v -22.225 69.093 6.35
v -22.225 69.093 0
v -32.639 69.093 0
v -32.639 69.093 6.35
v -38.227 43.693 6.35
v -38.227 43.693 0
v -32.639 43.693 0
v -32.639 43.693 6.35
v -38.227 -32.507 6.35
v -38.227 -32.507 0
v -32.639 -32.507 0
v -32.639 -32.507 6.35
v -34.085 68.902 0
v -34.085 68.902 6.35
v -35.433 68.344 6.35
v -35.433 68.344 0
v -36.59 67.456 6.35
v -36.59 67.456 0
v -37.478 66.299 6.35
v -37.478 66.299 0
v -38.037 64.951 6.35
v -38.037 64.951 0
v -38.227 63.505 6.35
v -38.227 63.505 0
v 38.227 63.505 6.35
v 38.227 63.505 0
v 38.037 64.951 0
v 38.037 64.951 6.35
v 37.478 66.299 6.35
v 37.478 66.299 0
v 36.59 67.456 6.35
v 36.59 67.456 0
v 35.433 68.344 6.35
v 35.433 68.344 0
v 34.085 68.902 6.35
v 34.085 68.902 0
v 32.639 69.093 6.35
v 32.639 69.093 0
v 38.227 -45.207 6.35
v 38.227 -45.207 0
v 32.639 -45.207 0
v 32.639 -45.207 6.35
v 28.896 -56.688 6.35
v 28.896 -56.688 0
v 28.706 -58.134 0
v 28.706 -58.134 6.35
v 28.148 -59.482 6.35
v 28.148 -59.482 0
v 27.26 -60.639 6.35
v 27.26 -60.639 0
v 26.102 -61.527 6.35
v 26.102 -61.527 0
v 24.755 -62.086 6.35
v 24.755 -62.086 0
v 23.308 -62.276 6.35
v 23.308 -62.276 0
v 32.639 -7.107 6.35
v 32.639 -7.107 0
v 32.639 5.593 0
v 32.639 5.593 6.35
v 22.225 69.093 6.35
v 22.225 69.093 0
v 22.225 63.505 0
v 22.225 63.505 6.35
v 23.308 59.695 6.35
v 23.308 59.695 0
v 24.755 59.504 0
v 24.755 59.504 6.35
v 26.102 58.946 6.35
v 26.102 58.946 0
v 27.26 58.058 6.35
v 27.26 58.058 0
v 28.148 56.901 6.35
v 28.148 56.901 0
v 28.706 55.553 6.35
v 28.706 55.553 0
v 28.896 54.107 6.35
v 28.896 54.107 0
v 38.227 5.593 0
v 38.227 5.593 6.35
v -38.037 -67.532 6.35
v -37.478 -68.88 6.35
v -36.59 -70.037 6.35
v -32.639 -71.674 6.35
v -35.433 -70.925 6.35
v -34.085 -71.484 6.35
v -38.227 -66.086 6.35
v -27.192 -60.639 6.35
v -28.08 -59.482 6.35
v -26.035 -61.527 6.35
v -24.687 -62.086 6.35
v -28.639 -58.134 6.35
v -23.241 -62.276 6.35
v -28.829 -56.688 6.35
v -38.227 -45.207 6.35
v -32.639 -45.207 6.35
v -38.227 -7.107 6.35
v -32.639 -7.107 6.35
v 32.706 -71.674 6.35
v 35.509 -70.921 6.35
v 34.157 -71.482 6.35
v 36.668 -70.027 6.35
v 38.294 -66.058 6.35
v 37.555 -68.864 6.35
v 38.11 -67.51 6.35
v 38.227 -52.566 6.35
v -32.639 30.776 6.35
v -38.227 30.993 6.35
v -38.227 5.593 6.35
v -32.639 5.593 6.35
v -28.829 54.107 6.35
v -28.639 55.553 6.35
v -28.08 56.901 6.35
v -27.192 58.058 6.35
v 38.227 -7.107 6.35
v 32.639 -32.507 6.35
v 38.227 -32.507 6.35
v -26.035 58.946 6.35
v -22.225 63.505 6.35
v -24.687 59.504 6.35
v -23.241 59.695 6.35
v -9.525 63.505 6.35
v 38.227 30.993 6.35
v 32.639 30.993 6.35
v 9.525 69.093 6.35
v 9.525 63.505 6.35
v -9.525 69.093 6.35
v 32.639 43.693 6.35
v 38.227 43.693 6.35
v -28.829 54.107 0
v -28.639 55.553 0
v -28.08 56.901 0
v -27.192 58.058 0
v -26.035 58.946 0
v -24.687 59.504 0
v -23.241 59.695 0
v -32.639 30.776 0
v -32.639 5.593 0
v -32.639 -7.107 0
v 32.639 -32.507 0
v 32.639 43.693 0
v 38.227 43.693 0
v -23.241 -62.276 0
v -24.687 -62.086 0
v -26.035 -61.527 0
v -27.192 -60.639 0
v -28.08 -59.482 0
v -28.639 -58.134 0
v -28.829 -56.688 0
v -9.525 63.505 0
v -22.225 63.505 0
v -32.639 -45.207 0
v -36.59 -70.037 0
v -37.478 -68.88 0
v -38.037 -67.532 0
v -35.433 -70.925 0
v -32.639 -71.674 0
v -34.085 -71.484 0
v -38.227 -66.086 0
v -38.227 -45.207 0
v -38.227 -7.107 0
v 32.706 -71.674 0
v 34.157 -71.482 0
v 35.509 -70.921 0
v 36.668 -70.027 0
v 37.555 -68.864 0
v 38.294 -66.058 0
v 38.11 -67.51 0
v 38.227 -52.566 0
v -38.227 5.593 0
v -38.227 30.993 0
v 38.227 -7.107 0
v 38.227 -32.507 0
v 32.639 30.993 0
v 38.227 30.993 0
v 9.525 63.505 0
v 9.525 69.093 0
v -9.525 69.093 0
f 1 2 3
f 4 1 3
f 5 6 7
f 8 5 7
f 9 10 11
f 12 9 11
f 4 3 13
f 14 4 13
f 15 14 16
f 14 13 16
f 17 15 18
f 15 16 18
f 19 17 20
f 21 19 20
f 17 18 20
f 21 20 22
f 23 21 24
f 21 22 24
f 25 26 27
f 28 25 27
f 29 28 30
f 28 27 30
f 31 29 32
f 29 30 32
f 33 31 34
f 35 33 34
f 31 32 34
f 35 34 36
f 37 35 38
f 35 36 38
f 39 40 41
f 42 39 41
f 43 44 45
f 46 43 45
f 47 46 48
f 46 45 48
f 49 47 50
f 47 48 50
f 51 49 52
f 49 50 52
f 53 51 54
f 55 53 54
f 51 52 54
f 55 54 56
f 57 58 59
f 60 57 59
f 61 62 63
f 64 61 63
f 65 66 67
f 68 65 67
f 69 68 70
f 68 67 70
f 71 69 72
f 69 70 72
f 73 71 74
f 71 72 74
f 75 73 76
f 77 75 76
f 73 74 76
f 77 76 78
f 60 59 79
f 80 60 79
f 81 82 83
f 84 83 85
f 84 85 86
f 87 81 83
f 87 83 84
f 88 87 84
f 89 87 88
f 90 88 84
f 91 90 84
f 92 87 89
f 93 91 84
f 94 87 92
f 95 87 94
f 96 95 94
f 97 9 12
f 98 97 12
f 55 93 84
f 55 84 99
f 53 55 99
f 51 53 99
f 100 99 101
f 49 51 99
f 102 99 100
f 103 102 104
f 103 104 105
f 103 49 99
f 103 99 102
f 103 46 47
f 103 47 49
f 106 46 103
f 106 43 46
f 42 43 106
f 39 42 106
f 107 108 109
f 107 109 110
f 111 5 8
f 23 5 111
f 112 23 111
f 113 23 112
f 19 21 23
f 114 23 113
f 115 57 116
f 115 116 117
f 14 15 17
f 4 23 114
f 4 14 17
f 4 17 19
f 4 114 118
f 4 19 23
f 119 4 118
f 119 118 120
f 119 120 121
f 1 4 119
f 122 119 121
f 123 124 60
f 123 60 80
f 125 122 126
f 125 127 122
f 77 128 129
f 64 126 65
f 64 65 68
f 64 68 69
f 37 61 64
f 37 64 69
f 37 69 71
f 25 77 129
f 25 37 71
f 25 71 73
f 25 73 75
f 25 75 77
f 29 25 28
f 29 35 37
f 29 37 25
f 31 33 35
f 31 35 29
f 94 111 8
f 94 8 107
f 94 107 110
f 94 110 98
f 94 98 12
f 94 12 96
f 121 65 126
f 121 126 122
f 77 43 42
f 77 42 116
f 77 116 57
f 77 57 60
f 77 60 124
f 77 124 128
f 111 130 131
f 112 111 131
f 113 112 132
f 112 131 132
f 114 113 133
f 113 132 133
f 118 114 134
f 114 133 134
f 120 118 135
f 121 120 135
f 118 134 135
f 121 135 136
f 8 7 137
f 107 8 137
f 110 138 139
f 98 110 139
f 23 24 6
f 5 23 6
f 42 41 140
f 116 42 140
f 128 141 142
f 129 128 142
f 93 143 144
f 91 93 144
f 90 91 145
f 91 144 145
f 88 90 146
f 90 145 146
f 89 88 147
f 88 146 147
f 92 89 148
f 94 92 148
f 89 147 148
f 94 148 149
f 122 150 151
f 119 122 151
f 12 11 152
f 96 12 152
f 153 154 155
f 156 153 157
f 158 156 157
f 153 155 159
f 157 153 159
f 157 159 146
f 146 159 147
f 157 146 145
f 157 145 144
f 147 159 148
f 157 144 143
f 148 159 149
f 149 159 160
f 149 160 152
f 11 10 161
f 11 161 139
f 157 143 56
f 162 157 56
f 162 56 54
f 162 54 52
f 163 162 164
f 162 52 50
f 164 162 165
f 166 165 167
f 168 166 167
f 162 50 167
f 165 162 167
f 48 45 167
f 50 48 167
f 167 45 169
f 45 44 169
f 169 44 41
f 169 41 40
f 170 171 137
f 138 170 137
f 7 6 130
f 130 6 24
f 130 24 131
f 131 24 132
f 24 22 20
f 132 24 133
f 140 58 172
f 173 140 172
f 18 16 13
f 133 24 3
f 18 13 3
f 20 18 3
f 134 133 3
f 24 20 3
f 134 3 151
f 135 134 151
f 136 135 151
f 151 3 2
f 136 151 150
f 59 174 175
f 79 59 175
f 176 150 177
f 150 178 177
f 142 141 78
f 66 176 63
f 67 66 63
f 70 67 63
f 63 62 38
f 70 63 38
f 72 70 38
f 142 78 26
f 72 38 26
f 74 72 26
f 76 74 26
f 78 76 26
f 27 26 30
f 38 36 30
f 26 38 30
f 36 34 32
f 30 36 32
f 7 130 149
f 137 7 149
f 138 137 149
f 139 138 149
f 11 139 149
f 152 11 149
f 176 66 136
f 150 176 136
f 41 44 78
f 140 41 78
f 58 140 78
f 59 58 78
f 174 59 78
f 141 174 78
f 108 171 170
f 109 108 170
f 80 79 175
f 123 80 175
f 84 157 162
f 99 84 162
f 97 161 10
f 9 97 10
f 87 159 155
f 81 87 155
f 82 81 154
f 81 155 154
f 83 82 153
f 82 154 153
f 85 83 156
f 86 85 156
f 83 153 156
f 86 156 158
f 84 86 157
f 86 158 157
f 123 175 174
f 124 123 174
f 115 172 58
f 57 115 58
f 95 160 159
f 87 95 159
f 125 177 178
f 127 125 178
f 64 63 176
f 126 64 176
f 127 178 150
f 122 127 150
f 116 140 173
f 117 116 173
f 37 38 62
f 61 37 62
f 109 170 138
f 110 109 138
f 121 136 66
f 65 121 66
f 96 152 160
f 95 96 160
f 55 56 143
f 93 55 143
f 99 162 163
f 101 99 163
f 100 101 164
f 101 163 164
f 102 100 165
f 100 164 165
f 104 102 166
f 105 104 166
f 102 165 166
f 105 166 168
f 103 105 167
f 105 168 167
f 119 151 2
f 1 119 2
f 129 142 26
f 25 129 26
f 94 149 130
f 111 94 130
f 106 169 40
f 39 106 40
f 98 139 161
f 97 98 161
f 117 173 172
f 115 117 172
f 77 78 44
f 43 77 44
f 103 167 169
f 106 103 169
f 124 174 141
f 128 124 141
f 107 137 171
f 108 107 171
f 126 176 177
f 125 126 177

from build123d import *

# Parameters (mm, degrees)
F1_DEPTH = 6.35


with BuildPart() as f1:
    # F0 (on Top) → F1 (new body)
    with BuildSketch(Plane.XY):
        with BuildLine():
            Line((-22.225, 69.092832), (-32.639, 69.092832))
            ThreePointArc((-32.639, 69.092832), (-36.590313, 67.456144), (-38.227, 63.504832))
            Line((-38.227, 63.504832), (-38.227, 43.692832))
            Line((-38.227, 43.692832), (-32.639, 43.692832))
            Line((-32.639, 43.692832), (-32.639, 30.775996))
            Line((-32.639, 30.775996), (-38.227, 30.992832))
            Line((-38.227, 30.992832), (-38.227, 5.592832))
            Line((-38.227, 5.592832), (-32.639, 5.592832))
            Line((-32.639, 5.592832), (-32.639, -7.107168))
            Line((-32.639, -7.107168), (-38.227, -7.107168))
            Line((-38.227, -7.107168), (-38.227, -32.507168))
            Line((-38.227, -32.507168), (-32.639, -32.507168))
            Line((-32.639, -32.507168), (-32.639, -45.207168))
            Line((-32.639, -45.207168), (-38.227, -45.207168))
            Line((-38.227, -45.207168), (-38.227, -52.56587))
            Line((-38.227, -52.56587), (-38.227, -66.085968))
            ThreePointArc((-38.227, -66.085968), (-36.590313, -70.037281), (-32.639, -71.673968))
            Line((-32.639, -71.673968), (-22.225, -71.673968))
            Line((-22.225, -71.673968), (-9.525, -71.673968))
            Line((-9.525, -71.673968), (9.525, -71.673968))
            Line((9.525, -71.673968), (22.225, -71.673968))
            Line((22.225, -71.673968), (32.706467, -71.673968))
            ThreePointArc((32.706467, -71.673968), (36.667636, -70.0274), (38.294397, -66.058055))
            Line((38.294397, -66.058055), (38.227, -52.56587))
            Line((38.227, -52.56587), (38.227, -45.207168))
            Line((38.227, -45.207168), (32.639, -45.207168))
            Line((32.639, -45.207168), (32.639, -32.507168))
            Line((32.639, -32.507168), (38.227, -32.507168))
            Line((38.227, -32.507168), (38.227, -7.107168))
            Line((38.227, -7.107168), (32.639, -7.107168))
            Line((32.639, -7.107168), (32.639, 5.592832))
            Line((32.639, 5.592832), (38.227, 5.592832))
            Line((38.227, 5.592832), (38.227, 30.992832))
            Line((38.227, 30.992832), (32.639, 30.992832))
            Line((32.639, 30.992832), (32.639, 43.692832))
            Line((32.639, 43.692832), (38.227, 43.692832))
            Line((38.227, 43.692832), (38.227, 63.504832))
            ThreePointArc((38.227, 63.504832), (36.590313, 67.456144), (32.639, 69.092832))
            Line((32.639, 69.092832), (22.225, 69.092832))
            Line((22.225, 69.092832), (22.225, 63.504832))
            Line((22.225, 63.504832), (9.525, 63.504832))
            Line((9.525, 63.504832), (9.525, 69.092832))
            Line((9.525, 69.092832), (-9.525, 69.092832))
            Line((-9.525, 69.092832), (-9.525, 63.504832))
            Line((-9.525, 63.504832), (-22.225, 63.504832))
            Line((-22.225, 63.504832), (-22.225, 69.092832))
        make_face()
        with BuildLine():
            Line((-28.829, -56.687968), (-28.829, 54.106832))
            ThreePointArc((-28.829, 54.106832), (-27.192313, 58.058144), (-23.241, 59.694832))
            Line((-23.241, 59.694832), (23.308467, 59.694832))
            ThreePointArc((23.308467, 59.694832), (27.25978, 58.058144), (28.896467, 54.106832))
            Line((28.896467, 54.106832), (28.896467, -56.687968))
            ThreePointArc((28.896467, -56.687968), (27.25978, -60.639281), (23.308467, -62.275968))
            Line((23.308467, -62.275968), (-23.241, -62.275968))
            ThreePointArc((-23.241, -62.275968), (-27.192313, -60.639281), (-28.829, -56.687968))
        make_face(mode=Mode.SUBTRACT)
    extrude(amount=F1_DEPTH)


solid = f1.part
